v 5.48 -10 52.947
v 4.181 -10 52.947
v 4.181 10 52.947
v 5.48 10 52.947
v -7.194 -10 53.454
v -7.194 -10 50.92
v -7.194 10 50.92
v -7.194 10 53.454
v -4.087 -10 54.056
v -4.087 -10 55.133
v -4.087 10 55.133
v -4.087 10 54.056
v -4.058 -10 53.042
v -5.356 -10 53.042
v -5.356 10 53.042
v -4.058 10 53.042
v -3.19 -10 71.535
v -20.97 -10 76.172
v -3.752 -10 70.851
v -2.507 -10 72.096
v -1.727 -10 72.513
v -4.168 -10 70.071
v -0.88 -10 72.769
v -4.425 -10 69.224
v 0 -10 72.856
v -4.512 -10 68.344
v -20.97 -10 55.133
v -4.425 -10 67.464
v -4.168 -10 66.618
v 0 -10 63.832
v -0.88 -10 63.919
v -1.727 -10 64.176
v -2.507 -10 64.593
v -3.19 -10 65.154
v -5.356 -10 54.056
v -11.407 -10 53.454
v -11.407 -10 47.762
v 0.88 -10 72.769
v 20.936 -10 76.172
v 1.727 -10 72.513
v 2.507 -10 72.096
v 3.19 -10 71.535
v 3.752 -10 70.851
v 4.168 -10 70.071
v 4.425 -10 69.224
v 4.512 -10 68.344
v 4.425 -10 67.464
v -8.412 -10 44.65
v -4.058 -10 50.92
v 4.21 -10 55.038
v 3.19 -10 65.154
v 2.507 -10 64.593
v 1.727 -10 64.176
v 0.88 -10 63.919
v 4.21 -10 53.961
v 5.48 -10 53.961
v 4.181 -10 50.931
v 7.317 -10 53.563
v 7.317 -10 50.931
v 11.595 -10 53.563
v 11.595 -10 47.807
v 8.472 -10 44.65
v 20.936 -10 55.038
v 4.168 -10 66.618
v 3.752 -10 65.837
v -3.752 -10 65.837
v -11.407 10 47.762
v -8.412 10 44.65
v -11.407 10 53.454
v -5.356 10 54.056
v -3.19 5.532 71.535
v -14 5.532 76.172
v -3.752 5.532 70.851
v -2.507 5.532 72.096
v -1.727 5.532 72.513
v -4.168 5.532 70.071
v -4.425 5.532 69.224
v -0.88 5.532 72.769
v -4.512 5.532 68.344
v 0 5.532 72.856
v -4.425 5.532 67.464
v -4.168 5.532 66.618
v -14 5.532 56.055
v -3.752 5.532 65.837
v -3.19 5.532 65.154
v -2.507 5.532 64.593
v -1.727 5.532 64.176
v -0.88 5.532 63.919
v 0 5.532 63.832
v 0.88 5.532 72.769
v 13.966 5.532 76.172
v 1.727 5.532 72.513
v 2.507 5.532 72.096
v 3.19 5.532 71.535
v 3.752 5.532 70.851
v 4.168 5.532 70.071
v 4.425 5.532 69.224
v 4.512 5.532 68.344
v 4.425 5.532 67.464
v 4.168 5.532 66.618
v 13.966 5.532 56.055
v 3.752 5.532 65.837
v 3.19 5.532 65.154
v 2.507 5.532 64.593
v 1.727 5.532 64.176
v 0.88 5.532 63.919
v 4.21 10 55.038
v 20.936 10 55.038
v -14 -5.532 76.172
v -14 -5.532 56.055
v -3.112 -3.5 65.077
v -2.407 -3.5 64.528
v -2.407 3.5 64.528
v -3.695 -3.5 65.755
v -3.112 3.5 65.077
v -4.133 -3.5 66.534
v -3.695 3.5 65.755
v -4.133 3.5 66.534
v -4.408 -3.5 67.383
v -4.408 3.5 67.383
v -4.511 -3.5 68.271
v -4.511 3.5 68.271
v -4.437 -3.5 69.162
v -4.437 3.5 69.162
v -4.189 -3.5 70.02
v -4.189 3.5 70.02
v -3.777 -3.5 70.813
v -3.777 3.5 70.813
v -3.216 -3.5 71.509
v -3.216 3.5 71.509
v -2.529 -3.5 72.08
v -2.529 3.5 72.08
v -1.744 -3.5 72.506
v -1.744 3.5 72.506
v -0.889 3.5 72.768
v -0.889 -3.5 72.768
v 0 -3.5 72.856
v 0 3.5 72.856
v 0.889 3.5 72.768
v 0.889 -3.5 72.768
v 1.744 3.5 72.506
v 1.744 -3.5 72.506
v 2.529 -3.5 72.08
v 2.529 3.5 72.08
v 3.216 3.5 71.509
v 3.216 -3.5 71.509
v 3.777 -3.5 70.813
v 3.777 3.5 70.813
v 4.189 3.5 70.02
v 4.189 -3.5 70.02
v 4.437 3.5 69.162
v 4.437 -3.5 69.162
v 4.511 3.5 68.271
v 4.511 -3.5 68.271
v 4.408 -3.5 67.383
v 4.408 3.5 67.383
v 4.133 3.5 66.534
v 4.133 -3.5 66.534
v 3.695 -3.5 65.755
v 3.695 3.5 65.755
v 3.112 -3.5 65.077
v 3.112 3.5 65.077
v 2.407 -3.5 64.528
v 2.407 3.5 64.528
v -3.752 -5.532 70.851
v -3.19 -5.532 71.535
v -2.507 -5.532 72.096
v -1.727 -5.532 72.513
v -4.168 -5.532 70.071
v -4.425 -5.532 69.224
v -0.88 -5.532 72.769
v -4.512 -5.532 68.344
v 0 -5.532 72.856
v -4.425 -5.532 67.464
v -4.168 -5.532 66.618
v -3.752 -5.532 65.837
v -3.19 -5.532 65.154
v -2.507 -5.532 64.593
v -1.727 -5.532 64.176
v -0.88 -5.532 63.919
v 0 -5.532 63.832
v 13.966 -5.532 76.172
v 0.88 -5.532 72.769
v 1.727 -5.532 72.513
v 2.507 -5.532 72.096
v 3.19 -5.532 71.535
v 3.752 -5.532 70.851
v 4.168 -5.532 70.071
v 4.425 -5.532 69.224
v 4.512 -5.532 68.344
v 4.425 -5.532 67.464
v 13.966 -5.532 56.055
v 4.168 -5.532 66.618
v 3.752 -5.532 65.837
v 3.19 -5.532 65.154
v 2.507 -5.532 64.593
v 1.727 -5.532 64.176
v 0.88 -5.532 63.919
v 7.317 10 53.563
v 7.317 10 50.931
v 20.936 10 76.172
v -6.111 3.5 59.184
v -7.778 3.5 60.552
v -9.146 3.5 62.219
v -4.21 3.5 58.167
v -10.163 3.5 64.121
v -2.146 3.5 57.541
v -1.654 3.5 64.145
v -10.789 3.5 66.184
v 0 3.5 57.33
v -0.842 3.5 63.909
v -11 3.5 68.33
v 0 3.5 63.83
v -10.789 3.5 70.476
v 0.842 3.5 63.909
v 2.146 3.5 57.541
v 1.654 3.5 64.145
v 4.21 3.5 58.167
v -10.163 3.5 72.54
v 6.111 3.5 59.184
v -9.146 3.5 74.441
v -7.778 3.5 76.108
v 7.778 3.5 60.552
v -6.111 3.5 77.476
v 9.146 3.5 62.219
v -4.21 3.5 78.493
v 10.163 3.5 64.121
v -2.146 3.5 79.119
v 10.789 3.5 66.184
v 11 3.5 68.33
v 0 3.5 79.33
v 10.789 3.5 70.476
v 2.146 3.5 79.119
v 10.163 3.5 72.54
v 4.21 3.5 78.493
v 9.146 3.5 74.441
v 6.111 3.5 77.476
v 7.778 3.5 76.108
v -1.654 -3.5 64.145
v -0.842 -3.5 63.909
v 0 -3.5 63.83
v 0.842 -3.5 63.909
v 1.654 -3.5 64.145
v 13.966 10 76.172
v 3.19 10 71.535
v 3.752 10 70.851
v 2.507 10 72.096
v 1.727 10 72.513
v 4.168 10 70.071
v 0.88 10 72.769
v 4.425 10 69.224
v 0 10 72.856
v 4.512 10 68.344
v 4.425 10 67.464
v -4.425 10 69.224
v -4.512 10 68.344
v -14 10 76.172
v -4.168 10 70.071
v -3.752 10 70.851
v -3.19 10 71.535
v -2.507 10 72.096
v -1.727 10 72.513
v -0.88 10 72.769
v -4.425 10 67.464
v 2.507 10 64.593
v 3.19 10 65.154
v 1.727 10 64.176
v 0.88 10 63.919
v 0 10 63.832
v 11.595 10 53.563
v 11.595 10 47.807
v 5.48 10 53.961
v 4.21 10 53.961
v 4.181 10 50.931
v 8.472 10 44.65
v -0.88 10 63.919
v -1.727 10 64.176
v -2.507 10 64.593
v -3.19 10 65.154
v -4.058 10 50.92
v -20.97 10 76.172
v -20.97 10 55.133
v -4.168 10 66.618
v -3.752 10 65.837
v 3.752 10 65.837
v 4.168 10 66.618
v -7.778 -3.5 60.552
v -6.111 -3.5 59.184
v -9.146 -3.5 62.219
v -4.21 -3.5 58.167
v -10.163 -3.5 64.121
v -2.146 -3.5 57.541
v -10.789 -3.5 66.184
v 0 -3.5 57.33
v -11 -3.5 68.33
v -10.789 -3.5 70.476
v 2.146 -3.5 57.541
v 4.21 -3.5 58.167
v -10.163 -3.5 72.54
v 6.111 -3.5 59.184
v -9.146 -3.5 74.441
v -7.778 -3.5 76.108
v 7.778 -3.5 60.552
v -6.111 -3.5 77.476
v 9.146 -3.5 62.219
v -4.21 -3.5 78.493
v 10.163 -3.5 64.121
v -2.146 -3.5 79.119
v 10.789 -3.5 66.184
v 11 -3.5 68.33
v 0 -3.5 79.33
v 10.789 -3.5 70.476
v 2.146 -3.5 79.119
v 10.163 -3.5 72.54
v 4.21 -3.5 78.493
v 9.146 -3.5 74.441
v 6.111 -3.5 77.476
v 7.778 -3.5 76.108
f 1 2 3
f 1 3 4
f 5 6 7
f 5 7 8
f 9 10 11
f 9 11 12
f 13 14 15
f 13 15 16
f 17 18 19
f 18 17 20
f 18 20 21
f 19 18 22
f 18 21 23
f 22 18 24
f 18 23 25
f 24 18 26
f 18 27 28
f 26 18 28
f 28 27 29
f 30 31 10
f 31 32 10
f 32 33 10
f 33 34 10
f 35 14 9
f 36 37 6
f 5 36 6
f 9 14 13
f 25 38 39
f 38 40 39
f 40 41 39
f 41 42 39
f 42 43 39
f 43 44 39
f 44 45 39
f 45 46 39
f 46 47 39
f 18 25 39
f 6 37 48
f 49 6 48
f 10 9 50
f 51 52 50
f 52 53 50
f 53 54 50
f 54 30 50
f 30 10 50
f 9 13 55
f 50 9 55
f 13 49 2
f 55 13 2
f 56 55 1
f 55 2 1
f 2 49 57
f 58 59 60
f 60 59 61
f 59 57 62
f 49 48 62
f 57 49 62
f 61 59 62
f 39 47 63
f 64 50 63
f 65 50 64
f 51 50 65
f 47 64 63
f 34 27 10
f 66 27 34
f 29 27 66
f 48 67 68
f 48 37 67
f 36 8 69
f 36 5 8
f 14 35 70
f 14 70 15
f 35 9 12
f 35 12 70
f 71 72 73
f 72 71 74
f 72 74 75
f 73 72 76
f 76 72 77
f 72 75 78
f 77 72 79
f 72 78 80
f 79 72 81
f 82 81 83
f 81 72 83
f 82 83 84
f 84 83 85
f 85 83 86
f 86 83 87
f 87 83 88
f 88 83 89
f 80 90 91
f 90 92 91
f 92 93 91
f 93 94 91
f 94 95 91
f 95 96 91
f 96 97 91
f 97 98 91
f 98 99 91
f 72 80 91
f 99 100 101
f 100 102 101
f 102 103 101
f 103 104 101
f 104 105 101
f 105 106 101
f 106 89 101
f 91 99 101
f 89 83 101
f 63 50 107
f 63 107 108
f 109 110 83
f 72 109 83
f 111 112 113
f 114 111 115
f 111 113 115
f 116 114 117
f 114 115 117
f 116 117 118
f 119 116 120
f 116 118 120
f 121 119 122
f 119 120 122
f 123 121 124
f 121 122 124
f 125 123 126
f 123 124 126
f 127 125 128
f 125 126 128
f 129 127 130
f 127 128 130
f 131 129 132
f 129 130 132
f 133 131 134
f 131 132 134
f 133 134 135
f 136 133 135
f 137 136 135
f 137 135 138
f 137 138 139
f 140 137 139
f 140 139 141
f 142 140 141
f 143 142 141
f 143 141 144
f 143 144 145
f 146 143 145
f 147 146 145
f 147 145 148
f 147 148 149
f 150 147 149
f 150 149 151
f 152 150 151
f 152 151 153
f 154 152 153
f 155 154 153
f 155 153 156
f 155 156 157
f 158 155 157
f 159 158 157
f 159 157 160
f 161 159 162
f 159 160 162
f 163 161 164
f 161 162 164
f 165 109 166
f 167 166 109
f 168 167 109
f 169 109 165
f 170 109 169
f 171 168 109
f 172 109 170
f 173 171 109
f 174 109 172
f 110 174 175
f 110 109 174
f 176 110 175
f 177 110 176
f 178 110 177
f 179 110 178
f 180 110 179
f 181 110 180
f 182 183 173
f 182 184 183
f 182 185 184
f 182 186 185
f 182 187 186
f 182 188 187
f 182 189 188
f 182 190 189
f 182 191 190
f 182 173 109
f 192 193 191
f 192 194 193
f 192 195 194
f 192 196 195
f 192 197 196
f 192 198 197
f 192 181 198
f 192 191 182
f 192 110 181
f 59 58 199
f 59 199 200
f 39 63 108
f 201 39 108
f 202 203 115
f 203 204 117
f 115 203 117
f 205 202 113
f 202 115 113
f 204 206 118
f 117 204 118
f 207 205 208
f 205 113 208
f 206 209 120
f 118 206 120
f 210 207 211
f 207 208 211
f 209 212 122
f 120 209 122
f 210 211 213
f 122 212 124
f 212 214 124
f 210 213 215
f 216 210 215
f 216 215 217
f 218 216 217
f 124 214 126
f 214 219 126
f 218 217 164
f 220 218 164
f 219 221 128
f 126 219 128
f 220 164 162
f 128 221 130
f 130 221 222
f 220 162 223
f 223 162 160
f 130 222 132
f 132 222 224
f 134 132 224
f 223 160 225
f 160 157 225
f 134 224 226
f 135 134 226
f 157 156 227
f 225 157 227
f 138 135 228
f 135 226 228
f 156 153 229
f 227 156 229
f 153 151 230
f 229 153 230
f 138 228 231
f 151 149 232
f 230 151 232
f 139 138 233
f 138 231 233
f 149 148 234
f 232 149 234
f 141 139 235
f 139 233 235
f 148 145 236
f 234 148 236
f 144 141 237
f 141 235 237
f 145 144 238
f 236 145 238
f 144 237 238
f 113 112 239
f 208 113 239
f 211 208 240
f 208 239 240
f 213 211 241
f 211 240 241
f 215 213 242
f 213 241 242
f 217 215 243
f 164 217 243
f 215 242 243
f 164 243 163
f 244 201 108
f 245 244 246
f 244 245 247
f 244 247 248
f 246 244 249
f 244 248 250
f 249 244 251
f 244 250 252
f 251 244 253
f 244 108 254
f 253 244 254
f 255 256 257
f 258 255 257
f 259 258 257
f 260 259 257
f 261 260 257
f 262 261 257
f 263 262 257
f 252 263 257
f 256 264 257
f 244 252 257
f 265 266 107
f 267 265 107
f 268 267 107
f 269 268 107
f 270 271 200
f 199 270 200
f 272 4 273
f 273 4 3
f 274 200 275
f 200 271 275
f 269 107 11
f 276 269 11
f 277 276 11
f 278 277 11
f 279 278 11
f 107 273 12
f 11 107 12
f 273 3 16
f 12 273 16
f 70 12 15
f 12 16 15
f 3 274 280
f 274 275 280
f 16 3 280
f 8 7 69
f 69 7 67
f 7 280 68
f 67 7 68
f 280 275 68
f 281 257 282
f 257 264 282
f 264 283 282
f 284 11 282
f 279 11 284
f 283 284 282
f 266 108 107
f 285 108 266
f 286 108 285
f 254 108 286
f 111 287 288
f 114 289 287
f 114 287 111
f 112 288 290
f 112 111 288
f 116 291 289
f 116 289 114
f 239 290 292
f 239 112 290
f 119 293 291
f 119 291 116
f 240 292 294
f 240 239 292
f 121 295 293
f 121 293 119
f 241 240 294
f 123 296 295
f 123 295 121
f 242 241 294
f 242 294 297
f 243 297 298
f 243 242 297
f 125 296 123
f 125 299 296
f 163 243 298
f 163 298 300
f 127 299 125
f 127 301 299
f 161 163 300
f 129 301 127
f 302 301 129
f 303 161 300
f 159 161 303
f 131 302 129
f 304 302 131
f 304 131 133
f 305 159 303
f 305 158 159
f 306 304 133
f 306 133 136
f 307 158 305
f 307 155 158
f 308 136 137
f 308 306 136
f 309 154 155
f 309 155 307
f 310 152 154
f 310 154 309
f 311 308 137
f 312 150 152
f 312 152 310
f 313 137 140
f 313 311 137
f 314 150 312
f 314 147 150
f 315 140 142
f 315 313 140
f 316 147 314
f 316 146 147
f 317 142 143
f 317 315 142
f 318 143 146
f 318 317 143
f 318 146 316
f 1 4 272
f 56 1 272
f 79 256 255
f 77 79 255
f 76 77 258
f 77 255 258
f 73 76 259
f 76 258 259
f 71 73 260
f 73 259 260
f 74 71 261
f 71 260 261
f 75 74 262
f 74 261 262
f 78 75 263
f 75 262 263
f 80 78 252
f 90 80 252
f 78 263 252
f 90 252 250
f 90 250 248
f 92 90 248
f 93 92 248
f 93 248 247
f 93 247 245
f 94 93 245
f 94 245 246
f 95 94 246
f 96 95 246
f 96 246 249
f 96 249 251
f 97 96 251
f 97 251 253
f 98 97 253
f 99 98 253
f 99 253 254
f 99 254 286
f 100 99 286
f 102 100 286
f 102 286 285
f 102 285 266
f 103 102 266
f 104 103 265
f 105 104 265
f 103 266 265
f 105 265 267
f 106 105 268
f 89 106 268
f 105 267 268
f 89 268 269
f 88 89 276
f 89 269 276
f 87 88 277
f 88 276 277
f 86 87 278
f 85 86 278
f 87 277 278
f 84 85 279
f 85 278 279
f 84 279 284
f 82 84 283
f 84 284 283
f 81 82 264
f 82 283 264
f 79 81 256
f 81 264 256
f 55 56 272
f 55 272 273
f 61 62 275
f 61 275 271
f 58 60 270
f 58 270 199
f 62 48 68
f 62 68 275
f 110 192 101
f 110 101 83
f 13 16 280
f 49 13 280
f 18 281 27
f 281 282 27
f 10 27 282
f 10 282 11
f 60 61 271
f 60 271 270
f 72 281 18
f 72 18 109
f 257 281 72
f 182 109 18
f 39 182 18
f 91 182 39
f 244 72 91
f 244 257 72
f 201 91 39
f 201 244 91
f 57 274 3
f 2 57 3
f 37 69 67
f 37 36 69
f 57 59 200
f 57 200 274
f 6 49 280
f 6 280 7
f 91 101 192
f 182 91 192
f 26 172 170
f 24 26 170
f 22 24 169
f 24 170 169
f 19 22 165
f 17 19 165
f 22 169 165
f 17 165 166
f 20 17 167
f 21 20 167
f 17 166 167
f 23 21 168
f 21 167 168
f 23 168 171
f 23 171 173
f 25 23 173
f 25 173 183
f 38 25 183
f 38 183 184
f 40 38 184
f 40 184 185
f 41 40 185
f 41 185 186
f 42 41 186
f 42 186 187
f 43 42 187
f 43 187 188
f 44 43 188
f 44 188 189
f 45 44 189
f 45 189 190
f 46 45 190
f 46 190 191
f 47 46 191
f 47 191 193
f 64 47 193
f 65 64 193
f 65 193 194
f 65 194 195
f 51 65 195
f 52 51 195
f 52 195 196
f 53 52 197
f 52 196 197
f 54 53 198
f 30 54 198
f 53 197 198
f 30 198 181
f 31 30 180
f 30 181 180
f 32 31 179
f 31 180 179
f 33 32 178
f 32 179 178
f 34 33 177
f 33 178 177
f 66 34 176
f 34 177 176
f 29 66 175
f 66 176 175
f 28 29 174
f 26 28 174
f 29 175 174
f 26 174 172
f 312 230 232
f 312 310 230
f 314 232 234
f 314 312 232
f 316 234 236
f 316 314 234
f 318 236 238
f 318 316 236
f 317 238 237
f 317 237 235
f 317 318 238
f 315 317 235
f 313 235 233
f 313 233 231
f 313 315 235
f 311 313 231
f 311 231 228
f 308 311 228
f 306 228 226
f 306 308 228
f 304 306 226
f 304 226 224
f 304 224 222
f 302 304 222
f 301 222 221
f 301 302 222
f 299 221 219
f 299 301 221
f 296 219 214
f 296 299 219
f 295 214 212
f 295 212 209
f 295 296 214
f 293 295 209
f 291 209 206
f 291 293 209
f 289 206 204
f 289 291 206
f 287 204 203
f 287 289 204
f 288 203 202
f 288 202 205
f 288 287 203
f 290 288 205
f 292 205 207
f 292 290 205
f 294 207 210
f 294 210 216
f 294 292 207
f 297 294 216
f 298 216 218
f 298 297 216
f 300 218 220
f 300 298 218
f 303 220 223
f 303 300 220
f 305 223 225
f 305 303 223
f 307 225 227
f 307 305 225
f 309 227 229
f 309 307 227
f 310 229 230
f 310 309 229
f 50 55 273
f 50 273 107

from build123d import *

# Parameters (mm, degrees)
F1_R     = 11
F1_R_2   = 4.5
F2_DEPTH = 3.5
F3_DEPTH = 10
F4_DEPTH = 10
F5_DEPTH = 3.5
F6_W     = 27.9663609021
F6_H     = 4.4681232143
F6_H_2   = 4.468114
F7_DEPTH = 20.1168
F9_D     = 9.0238834
F9_2_D   = 9.0238834


with BuildPart() as f2:
    # F1 (on Front) → F2 (new body)
    with BuildSketch(Plane.XZ):
        with Locations((0, 68.3300495148)):
            Circle(F1_R)
        with Locations((0, 68.3300495148)):
            Circle(F1_R_2, mode=Mode.SUBTRACT)
    extrude(amount=F2_DEPTH)

    # F1 (on Front) → F5 (join)
    with BuildSketch(Plane.XZ):
        with Locations((0, 68.3300495148)):
            Circle(F1_R)
        with Locations((0, 68.3300495148)):
            Circle(F1_R_2, mode=Mode.SUBTRACT)
    extrude(amount=-F5_DEPTH)

    # F9 (through all)
    with Locations(Plane.XZ.offset(10)):
        with Locations((0, 68.3441758156)):
            Hole(F9_D / 2)


with BuildPart() as f3:
    # F0 (on Front) → F3 (new body)
    with BuildSketch(Plane.XZ):
        Polygon((-11.4066531532, 47.7624452322), (-8.4118793069, 44.6501635015), (8.4724111924, 44.6501635015), (11.5947960294, 47.8070096632), (11.5947960294, 53.5628460348), (7.3167806841, 53.5628460348), (7.3167806841, 50.9305819869), (4.1807577363, 50.9305819869), (4.1807577363, 52.9469698668), (5.4795145406, 52.9469698668), (5.4795145406, 53.9606362581), (4.2101069703, 53.9606362581), (4.2101069703, 55.0376549363), (20.9357491112, 55.0376549363), (20.9357491112, 56.0549552958), (-20.9702910506, 56.0549552958), (-20.9702910506, 55.1326839005), (-4.0869387449, 55.1326839005), (-4.0869387449, 54.0556652223), (-5.3563463152, 54.0556652223), (-5.3563463152, 53.0420020223), (-4.0575895109, 53.0420020223), (-4.0575895109, 50.9196408093), (-7.1936124587, 50.9196408093), (-7.1936124587, 53.4538030624), (-11.4066531532, 53.4538030624), align=None)
    extrude(amount=F3_DEPTH)

    # F0 (on Front) → F4 (join)
    with BuildSketch(Plane.XZ):
        Polygon((-11.4066531532, 47.7624452322), (-8.4118793069, 44.6501635015), (8.4724111924, 44.6501635015), (11.5947960294, 47.8070096632), (11.5947960294, 53.5628460348), (7.3167806841, 53.5628460348), (7.3167806841, 50.9305819869), (4.1807577363, 50.9305819869), (4.1807577363, 52.9469698668), (5.4795145406, 52.9469698668), (5.4795145406, 53.9606362581), (4.2101069703, 53.9606362581), (4.2101069703, 55.0376549363), (20.9357491112, 55.0376549363), (20.9357491112, 56.0549552958), (-20.9702910506, 56.0549552958), (-20.9702910506, 55.1326839005), (-4.0869387449, 55.1326839005), (-4.0869387449, 54.0556652223), (-5.3563463152, 54.0556652223), (-5.3563463152, 53.0420020223), (-4.0575895109, 53.0420020223), (-4.0575895109, 50.9196408093), (-7.1936124587, 50.9196408093), (-7.1936124587, 53.4538030624), (-11.4066531532, 53.4538030624), align=None)
    extrude(amount=-F4_DEPTH)

    # F6 (on face) → F7 (join)
    with BuildSketch(Plane.XY.offset(56.0549552958)):
        Polygon((20.9357491112, -10), (20.9357491112, 10), (13.9659060515, 10), (13.9659060515, 5.5318767857), (13.9659060515, -5.531886), (13.9659060515, -10), align=None)
        with Locations((-0.0172743996, 7.7659383928)):
            Rectangle(F6_W, F6_H)
        Polygon((-14.0004548506, 5.5318767857), (-14.0004548506, 10), (-20.9702910506, 10), (-20.9702910506, -10), (-14.0004548506, -10), (-14.0004548506, -5.531886), align=None)
        with Locations((-0.0172743996, -7.765943)):
            Rectangle(F6_W, F6_H_2)
    extrude(amount=F7_DEPTH)

    # F9#2 (through all)
    with Locations(Plane.XZ.offset(10)):
        with Locations((0, 68.3441758156)):
            Hole(F9_2_D / 2)


solid = Compound([f2.part, f3.part])
